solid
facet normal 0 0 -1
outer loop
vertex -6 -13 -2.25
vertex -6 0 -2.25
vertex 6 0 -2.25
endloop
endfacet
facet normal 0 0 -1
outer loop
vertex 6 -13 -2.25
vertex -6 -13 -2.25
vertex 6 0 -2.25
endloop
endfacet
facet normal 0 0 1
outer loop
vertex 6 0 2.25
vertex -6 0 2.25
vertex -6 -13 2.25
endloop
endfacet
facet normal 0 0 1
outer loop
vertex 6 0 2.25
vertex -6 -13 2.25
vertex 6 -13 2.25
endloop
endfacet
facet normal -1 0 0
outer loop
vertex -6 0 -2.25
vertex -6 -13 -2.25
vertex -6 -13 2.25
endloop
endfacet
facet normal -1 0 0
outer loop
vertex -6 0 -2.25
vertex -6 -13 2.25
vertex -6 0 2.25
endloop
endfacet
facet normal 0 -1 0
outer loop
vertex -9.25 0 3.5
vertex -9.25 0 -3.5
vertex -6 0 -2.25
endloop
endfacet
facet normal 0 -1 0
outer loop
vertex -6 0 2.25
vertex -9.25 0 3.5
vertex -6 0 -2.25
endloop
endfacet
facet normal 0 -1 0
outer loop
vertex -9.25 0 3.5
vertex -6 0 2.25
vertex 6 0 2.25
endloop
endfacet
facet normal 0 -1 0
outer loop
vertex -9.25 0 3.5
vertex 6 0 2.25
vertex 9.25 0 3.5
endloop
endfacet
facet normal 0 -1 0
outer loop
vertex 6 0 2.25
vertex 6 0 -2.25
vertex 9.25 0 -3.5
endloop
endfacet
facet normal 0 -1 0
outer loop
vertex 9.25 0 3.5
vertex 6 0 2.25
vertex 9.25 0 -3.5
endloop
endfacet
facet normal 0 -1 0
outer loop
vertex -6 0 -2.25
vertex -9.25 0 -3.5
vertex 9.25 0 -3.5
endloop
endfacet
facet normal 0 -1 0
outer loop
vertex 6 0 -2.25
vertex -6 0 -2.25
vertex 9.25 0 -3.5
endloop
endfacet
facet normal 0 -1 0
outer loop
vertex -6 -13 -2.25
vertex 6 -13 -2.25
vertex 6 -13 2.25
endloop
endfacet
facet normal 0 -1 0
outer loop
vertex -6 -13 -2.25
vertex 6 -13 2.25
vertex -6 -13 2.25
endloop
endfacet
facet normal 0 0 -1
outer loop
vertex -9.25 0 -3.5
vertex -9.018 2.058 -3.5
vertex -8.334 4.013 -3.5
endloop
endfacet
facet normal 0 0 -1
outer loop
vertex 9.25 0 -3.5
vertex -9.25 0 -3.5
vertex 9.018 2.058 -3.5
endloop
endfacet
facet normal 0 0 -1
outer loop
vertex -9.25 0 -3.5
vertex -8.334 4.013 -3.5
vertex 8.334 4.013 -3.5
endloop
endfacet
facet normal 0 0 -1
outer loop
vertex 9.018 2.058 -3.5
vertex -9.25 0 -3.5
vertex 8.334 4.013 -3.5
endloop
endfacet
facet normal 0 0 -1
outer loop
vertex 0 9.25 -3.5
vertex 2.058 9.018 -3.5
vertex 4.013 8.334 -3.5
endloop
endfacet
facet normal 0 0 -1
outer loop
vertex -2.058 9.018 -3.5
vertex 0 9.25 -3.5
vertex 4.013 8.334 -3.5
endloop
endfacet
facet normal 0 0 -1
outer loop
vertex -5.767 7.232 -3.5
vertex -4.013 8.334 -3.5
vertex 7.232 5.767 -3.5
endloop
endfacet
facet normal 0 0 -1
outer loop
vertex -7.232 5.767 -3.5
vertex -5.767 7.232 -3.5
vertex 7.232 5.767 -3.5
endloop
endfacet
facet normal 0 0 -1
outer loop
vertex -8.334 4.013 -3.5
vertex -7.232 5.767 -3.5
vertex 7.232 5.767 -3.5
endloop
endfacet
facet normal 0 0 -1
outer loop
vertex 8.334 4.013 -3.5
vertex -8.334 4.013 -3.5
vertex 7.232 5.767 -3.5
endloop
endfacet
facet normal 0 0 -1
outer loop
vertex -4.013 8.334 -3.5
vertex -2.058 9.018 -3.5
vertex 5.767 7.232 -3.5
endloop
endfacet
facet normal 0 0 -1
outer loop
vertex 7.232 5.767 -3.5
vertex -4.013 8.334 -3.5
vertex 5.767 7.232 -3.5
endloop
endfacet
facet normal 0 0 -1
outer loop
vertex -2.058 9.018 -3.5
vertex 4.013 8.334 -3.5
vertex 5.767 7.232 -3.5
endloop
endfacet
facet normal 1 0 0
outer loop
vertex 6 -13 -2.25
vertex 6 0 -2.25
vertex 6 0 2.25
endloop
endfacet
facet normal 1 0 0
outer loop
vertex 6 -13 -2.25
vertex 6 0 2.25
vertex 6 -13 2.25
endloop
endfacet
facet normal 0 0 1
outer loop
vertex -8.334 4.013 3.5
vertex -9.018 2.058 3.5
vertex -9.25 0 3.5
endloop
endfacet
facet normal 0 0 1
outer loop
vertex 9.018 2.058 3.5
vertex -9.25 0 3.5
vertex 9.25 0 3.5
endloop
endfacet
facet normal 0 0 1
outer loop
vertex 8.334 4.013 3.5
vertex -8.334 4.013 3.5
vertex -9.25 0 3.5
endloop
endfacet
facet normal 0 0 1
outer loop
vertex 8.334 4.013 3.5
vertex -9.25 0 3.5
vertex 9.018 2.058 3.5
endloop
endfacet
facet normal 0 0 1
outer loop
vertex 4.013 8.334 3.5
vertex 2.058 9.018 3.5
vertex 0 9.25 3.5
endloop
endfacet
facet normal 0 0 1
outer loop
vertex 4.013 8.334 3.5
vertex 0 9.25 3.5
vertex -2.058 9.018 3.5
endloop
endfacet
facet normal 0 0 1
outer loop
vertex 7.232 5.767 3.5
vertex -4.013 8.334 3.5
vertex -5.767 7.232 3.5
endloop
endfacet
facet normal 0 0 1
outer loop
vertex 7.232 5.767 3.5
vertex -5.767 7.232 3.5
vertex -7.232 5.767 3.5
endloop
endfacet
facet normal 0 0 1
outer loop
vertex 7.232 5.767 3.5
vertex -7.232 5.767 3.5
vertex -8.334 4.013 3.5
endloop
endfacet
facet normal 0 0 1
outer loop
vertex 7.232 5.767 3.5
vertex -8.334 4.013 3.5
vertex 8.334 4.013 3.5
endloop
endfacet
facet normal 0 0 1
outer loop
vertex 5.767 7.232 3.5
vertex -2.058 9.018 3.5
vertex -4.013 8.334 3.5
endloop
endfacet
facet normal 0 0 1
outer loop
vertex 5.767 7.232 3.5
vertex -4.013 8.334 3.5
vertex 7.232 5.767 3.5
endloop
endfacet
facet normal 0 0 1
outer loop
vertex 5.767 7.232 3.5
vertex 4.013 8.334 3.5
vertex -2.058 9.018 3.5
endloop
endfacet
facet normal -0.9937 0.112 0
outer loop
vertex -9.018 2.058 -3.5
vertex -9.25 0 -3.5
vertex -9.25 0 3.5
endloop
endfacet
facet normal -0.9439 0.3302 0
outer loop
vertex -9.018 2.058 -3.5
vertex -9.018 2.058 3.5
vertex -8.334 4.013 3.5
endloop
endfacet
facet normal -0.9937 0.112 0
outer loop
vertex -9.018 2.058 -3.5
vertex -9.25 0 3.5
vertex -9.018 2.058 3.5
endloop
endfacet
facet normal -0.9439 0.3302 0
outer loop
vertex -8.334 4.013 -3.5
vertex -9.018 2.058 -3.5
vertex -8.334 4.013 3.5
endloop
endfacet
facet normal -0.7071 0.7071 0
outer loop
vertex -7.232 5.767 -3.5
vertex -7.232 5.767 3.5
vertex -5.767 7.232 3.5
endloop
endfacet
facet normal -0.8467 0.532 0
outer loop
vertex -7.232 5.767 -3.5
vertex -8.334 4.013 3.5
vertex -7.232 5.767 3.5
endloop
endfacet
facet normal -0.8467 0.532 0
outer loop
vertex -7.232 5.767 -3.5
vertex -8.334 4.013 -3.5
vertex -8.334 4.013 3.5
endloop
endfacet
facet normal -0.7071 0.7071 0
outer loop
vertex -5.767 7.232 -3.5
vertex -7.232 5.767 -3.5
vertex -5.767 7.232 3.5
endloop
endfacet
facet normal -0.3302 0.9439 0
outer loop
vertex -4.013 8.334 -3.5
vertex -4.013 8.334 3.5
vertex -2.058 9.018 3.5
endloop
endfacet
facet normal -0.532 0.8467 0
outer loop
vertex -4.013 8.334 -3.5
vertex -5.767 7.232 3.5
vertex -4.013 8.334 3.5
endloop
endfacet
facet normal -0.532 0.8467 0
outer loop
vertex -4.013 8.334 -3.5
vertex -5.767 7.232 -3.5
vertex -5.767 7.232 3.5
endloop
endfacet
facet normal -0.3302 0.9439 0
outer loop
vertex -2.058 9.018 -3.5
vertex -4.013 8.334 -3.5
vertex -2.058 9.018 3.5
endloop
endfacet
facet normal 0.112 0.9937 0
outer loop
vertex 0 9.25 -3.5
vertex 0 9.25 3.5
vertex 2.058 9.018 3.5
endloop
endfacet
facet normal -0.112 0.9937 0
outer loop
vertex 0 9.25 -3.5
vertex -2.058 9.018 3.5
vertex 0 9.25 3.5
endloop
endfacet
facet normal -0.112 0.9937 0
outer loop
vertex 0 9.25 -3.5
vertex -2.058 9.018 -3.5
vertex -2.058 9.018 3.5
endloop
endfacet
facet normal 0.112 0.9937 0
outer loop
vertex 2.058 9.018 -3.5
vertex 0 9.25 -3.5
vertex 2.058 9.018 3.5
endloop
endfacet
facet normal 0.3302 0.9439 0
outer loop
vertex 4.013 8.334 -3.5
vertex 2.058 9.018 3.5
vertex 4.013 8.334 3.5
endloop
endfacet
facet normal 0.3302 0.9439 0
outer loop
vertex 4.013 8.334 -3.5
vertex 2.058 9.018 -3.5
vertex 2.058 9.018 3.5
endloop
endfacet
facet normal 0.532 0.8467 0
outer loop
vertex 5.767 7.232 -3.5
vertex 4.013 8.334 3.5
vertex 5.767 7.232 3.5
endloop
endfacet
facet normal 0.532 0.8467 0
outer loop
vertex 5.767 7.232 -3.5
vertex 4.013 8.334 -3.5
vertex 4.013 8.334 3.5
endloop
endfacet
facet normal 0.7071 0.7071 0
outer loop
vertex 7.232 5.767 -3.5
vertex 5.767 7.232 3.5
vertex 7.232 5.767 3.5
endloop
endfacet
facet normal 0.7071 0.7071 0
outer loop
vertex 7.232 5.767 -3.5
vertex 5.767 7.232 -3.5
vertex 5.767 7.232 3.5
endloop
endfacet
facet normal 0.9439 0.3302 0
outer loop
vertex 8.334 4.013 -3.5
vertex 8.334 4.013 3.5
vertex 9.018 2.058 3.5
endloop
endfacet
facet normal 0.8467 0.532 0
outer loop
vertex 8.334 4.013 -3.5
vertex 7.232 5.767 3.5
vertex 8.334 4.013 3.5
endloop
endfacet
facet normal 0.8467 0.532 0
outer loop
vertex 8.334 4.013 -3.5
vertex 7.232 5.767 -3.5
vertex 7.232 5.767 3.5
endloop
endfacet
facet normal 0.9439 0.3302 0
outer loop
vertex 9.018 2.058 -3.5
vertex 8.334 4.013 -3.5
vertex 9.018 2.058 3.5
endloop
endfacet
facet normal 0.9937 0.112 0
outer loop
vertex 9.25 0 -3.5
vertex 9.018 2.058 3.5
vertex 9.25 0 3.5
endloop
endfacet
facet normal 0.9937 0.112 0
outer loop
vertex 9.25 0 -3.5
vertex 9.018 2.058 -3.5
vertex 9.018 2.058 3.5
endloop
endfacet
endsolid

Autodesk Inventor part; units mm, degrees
ref_plane "YZ Plane" through (0, 0, 0) normal (1, 0, 0) x (0, 1, 0)
ref_plane "XZ Plane" through (0, 0, 0) normal (0, 1, 0) x (-1, 0, 0)
ref_plane "XY Plane" through (0, 0, 0) normal (0, 0, 1) x (1, 0, 0)
sketch "스케치1" plane through (0, 0, 0) normal (0, 0, 1) x (1, 0, 0)
  line L0 (-9.25, 0) -> (9.25, 0)
  arc A0 (9.25, 0) -> (-9.25, 0) centre (0, 0) ccw
  line L1 (0, 9.25) -> (0, 0) construction
  line L2 (-6, 0) -> (6, 0)
  line L3 (6, 0) -> (6, -13)
  line L4 (6, -13) -> (-6, -13)
  line L5 (-6, -13) -> (-6, 0)
  dimension "d0" = 18.5
  dimension "d1" = 9.25
  dimension "d2" = 12
  dimension "d3" = 13
extrude "돌출1" add sketch "스케치1" along normal mid plane 7 contours A0 L0
extrude "돌출2" add sketch "스케치1" along normal mid plane 4.5 contours L0 L3 L4 L5
properties part number "Mic"
